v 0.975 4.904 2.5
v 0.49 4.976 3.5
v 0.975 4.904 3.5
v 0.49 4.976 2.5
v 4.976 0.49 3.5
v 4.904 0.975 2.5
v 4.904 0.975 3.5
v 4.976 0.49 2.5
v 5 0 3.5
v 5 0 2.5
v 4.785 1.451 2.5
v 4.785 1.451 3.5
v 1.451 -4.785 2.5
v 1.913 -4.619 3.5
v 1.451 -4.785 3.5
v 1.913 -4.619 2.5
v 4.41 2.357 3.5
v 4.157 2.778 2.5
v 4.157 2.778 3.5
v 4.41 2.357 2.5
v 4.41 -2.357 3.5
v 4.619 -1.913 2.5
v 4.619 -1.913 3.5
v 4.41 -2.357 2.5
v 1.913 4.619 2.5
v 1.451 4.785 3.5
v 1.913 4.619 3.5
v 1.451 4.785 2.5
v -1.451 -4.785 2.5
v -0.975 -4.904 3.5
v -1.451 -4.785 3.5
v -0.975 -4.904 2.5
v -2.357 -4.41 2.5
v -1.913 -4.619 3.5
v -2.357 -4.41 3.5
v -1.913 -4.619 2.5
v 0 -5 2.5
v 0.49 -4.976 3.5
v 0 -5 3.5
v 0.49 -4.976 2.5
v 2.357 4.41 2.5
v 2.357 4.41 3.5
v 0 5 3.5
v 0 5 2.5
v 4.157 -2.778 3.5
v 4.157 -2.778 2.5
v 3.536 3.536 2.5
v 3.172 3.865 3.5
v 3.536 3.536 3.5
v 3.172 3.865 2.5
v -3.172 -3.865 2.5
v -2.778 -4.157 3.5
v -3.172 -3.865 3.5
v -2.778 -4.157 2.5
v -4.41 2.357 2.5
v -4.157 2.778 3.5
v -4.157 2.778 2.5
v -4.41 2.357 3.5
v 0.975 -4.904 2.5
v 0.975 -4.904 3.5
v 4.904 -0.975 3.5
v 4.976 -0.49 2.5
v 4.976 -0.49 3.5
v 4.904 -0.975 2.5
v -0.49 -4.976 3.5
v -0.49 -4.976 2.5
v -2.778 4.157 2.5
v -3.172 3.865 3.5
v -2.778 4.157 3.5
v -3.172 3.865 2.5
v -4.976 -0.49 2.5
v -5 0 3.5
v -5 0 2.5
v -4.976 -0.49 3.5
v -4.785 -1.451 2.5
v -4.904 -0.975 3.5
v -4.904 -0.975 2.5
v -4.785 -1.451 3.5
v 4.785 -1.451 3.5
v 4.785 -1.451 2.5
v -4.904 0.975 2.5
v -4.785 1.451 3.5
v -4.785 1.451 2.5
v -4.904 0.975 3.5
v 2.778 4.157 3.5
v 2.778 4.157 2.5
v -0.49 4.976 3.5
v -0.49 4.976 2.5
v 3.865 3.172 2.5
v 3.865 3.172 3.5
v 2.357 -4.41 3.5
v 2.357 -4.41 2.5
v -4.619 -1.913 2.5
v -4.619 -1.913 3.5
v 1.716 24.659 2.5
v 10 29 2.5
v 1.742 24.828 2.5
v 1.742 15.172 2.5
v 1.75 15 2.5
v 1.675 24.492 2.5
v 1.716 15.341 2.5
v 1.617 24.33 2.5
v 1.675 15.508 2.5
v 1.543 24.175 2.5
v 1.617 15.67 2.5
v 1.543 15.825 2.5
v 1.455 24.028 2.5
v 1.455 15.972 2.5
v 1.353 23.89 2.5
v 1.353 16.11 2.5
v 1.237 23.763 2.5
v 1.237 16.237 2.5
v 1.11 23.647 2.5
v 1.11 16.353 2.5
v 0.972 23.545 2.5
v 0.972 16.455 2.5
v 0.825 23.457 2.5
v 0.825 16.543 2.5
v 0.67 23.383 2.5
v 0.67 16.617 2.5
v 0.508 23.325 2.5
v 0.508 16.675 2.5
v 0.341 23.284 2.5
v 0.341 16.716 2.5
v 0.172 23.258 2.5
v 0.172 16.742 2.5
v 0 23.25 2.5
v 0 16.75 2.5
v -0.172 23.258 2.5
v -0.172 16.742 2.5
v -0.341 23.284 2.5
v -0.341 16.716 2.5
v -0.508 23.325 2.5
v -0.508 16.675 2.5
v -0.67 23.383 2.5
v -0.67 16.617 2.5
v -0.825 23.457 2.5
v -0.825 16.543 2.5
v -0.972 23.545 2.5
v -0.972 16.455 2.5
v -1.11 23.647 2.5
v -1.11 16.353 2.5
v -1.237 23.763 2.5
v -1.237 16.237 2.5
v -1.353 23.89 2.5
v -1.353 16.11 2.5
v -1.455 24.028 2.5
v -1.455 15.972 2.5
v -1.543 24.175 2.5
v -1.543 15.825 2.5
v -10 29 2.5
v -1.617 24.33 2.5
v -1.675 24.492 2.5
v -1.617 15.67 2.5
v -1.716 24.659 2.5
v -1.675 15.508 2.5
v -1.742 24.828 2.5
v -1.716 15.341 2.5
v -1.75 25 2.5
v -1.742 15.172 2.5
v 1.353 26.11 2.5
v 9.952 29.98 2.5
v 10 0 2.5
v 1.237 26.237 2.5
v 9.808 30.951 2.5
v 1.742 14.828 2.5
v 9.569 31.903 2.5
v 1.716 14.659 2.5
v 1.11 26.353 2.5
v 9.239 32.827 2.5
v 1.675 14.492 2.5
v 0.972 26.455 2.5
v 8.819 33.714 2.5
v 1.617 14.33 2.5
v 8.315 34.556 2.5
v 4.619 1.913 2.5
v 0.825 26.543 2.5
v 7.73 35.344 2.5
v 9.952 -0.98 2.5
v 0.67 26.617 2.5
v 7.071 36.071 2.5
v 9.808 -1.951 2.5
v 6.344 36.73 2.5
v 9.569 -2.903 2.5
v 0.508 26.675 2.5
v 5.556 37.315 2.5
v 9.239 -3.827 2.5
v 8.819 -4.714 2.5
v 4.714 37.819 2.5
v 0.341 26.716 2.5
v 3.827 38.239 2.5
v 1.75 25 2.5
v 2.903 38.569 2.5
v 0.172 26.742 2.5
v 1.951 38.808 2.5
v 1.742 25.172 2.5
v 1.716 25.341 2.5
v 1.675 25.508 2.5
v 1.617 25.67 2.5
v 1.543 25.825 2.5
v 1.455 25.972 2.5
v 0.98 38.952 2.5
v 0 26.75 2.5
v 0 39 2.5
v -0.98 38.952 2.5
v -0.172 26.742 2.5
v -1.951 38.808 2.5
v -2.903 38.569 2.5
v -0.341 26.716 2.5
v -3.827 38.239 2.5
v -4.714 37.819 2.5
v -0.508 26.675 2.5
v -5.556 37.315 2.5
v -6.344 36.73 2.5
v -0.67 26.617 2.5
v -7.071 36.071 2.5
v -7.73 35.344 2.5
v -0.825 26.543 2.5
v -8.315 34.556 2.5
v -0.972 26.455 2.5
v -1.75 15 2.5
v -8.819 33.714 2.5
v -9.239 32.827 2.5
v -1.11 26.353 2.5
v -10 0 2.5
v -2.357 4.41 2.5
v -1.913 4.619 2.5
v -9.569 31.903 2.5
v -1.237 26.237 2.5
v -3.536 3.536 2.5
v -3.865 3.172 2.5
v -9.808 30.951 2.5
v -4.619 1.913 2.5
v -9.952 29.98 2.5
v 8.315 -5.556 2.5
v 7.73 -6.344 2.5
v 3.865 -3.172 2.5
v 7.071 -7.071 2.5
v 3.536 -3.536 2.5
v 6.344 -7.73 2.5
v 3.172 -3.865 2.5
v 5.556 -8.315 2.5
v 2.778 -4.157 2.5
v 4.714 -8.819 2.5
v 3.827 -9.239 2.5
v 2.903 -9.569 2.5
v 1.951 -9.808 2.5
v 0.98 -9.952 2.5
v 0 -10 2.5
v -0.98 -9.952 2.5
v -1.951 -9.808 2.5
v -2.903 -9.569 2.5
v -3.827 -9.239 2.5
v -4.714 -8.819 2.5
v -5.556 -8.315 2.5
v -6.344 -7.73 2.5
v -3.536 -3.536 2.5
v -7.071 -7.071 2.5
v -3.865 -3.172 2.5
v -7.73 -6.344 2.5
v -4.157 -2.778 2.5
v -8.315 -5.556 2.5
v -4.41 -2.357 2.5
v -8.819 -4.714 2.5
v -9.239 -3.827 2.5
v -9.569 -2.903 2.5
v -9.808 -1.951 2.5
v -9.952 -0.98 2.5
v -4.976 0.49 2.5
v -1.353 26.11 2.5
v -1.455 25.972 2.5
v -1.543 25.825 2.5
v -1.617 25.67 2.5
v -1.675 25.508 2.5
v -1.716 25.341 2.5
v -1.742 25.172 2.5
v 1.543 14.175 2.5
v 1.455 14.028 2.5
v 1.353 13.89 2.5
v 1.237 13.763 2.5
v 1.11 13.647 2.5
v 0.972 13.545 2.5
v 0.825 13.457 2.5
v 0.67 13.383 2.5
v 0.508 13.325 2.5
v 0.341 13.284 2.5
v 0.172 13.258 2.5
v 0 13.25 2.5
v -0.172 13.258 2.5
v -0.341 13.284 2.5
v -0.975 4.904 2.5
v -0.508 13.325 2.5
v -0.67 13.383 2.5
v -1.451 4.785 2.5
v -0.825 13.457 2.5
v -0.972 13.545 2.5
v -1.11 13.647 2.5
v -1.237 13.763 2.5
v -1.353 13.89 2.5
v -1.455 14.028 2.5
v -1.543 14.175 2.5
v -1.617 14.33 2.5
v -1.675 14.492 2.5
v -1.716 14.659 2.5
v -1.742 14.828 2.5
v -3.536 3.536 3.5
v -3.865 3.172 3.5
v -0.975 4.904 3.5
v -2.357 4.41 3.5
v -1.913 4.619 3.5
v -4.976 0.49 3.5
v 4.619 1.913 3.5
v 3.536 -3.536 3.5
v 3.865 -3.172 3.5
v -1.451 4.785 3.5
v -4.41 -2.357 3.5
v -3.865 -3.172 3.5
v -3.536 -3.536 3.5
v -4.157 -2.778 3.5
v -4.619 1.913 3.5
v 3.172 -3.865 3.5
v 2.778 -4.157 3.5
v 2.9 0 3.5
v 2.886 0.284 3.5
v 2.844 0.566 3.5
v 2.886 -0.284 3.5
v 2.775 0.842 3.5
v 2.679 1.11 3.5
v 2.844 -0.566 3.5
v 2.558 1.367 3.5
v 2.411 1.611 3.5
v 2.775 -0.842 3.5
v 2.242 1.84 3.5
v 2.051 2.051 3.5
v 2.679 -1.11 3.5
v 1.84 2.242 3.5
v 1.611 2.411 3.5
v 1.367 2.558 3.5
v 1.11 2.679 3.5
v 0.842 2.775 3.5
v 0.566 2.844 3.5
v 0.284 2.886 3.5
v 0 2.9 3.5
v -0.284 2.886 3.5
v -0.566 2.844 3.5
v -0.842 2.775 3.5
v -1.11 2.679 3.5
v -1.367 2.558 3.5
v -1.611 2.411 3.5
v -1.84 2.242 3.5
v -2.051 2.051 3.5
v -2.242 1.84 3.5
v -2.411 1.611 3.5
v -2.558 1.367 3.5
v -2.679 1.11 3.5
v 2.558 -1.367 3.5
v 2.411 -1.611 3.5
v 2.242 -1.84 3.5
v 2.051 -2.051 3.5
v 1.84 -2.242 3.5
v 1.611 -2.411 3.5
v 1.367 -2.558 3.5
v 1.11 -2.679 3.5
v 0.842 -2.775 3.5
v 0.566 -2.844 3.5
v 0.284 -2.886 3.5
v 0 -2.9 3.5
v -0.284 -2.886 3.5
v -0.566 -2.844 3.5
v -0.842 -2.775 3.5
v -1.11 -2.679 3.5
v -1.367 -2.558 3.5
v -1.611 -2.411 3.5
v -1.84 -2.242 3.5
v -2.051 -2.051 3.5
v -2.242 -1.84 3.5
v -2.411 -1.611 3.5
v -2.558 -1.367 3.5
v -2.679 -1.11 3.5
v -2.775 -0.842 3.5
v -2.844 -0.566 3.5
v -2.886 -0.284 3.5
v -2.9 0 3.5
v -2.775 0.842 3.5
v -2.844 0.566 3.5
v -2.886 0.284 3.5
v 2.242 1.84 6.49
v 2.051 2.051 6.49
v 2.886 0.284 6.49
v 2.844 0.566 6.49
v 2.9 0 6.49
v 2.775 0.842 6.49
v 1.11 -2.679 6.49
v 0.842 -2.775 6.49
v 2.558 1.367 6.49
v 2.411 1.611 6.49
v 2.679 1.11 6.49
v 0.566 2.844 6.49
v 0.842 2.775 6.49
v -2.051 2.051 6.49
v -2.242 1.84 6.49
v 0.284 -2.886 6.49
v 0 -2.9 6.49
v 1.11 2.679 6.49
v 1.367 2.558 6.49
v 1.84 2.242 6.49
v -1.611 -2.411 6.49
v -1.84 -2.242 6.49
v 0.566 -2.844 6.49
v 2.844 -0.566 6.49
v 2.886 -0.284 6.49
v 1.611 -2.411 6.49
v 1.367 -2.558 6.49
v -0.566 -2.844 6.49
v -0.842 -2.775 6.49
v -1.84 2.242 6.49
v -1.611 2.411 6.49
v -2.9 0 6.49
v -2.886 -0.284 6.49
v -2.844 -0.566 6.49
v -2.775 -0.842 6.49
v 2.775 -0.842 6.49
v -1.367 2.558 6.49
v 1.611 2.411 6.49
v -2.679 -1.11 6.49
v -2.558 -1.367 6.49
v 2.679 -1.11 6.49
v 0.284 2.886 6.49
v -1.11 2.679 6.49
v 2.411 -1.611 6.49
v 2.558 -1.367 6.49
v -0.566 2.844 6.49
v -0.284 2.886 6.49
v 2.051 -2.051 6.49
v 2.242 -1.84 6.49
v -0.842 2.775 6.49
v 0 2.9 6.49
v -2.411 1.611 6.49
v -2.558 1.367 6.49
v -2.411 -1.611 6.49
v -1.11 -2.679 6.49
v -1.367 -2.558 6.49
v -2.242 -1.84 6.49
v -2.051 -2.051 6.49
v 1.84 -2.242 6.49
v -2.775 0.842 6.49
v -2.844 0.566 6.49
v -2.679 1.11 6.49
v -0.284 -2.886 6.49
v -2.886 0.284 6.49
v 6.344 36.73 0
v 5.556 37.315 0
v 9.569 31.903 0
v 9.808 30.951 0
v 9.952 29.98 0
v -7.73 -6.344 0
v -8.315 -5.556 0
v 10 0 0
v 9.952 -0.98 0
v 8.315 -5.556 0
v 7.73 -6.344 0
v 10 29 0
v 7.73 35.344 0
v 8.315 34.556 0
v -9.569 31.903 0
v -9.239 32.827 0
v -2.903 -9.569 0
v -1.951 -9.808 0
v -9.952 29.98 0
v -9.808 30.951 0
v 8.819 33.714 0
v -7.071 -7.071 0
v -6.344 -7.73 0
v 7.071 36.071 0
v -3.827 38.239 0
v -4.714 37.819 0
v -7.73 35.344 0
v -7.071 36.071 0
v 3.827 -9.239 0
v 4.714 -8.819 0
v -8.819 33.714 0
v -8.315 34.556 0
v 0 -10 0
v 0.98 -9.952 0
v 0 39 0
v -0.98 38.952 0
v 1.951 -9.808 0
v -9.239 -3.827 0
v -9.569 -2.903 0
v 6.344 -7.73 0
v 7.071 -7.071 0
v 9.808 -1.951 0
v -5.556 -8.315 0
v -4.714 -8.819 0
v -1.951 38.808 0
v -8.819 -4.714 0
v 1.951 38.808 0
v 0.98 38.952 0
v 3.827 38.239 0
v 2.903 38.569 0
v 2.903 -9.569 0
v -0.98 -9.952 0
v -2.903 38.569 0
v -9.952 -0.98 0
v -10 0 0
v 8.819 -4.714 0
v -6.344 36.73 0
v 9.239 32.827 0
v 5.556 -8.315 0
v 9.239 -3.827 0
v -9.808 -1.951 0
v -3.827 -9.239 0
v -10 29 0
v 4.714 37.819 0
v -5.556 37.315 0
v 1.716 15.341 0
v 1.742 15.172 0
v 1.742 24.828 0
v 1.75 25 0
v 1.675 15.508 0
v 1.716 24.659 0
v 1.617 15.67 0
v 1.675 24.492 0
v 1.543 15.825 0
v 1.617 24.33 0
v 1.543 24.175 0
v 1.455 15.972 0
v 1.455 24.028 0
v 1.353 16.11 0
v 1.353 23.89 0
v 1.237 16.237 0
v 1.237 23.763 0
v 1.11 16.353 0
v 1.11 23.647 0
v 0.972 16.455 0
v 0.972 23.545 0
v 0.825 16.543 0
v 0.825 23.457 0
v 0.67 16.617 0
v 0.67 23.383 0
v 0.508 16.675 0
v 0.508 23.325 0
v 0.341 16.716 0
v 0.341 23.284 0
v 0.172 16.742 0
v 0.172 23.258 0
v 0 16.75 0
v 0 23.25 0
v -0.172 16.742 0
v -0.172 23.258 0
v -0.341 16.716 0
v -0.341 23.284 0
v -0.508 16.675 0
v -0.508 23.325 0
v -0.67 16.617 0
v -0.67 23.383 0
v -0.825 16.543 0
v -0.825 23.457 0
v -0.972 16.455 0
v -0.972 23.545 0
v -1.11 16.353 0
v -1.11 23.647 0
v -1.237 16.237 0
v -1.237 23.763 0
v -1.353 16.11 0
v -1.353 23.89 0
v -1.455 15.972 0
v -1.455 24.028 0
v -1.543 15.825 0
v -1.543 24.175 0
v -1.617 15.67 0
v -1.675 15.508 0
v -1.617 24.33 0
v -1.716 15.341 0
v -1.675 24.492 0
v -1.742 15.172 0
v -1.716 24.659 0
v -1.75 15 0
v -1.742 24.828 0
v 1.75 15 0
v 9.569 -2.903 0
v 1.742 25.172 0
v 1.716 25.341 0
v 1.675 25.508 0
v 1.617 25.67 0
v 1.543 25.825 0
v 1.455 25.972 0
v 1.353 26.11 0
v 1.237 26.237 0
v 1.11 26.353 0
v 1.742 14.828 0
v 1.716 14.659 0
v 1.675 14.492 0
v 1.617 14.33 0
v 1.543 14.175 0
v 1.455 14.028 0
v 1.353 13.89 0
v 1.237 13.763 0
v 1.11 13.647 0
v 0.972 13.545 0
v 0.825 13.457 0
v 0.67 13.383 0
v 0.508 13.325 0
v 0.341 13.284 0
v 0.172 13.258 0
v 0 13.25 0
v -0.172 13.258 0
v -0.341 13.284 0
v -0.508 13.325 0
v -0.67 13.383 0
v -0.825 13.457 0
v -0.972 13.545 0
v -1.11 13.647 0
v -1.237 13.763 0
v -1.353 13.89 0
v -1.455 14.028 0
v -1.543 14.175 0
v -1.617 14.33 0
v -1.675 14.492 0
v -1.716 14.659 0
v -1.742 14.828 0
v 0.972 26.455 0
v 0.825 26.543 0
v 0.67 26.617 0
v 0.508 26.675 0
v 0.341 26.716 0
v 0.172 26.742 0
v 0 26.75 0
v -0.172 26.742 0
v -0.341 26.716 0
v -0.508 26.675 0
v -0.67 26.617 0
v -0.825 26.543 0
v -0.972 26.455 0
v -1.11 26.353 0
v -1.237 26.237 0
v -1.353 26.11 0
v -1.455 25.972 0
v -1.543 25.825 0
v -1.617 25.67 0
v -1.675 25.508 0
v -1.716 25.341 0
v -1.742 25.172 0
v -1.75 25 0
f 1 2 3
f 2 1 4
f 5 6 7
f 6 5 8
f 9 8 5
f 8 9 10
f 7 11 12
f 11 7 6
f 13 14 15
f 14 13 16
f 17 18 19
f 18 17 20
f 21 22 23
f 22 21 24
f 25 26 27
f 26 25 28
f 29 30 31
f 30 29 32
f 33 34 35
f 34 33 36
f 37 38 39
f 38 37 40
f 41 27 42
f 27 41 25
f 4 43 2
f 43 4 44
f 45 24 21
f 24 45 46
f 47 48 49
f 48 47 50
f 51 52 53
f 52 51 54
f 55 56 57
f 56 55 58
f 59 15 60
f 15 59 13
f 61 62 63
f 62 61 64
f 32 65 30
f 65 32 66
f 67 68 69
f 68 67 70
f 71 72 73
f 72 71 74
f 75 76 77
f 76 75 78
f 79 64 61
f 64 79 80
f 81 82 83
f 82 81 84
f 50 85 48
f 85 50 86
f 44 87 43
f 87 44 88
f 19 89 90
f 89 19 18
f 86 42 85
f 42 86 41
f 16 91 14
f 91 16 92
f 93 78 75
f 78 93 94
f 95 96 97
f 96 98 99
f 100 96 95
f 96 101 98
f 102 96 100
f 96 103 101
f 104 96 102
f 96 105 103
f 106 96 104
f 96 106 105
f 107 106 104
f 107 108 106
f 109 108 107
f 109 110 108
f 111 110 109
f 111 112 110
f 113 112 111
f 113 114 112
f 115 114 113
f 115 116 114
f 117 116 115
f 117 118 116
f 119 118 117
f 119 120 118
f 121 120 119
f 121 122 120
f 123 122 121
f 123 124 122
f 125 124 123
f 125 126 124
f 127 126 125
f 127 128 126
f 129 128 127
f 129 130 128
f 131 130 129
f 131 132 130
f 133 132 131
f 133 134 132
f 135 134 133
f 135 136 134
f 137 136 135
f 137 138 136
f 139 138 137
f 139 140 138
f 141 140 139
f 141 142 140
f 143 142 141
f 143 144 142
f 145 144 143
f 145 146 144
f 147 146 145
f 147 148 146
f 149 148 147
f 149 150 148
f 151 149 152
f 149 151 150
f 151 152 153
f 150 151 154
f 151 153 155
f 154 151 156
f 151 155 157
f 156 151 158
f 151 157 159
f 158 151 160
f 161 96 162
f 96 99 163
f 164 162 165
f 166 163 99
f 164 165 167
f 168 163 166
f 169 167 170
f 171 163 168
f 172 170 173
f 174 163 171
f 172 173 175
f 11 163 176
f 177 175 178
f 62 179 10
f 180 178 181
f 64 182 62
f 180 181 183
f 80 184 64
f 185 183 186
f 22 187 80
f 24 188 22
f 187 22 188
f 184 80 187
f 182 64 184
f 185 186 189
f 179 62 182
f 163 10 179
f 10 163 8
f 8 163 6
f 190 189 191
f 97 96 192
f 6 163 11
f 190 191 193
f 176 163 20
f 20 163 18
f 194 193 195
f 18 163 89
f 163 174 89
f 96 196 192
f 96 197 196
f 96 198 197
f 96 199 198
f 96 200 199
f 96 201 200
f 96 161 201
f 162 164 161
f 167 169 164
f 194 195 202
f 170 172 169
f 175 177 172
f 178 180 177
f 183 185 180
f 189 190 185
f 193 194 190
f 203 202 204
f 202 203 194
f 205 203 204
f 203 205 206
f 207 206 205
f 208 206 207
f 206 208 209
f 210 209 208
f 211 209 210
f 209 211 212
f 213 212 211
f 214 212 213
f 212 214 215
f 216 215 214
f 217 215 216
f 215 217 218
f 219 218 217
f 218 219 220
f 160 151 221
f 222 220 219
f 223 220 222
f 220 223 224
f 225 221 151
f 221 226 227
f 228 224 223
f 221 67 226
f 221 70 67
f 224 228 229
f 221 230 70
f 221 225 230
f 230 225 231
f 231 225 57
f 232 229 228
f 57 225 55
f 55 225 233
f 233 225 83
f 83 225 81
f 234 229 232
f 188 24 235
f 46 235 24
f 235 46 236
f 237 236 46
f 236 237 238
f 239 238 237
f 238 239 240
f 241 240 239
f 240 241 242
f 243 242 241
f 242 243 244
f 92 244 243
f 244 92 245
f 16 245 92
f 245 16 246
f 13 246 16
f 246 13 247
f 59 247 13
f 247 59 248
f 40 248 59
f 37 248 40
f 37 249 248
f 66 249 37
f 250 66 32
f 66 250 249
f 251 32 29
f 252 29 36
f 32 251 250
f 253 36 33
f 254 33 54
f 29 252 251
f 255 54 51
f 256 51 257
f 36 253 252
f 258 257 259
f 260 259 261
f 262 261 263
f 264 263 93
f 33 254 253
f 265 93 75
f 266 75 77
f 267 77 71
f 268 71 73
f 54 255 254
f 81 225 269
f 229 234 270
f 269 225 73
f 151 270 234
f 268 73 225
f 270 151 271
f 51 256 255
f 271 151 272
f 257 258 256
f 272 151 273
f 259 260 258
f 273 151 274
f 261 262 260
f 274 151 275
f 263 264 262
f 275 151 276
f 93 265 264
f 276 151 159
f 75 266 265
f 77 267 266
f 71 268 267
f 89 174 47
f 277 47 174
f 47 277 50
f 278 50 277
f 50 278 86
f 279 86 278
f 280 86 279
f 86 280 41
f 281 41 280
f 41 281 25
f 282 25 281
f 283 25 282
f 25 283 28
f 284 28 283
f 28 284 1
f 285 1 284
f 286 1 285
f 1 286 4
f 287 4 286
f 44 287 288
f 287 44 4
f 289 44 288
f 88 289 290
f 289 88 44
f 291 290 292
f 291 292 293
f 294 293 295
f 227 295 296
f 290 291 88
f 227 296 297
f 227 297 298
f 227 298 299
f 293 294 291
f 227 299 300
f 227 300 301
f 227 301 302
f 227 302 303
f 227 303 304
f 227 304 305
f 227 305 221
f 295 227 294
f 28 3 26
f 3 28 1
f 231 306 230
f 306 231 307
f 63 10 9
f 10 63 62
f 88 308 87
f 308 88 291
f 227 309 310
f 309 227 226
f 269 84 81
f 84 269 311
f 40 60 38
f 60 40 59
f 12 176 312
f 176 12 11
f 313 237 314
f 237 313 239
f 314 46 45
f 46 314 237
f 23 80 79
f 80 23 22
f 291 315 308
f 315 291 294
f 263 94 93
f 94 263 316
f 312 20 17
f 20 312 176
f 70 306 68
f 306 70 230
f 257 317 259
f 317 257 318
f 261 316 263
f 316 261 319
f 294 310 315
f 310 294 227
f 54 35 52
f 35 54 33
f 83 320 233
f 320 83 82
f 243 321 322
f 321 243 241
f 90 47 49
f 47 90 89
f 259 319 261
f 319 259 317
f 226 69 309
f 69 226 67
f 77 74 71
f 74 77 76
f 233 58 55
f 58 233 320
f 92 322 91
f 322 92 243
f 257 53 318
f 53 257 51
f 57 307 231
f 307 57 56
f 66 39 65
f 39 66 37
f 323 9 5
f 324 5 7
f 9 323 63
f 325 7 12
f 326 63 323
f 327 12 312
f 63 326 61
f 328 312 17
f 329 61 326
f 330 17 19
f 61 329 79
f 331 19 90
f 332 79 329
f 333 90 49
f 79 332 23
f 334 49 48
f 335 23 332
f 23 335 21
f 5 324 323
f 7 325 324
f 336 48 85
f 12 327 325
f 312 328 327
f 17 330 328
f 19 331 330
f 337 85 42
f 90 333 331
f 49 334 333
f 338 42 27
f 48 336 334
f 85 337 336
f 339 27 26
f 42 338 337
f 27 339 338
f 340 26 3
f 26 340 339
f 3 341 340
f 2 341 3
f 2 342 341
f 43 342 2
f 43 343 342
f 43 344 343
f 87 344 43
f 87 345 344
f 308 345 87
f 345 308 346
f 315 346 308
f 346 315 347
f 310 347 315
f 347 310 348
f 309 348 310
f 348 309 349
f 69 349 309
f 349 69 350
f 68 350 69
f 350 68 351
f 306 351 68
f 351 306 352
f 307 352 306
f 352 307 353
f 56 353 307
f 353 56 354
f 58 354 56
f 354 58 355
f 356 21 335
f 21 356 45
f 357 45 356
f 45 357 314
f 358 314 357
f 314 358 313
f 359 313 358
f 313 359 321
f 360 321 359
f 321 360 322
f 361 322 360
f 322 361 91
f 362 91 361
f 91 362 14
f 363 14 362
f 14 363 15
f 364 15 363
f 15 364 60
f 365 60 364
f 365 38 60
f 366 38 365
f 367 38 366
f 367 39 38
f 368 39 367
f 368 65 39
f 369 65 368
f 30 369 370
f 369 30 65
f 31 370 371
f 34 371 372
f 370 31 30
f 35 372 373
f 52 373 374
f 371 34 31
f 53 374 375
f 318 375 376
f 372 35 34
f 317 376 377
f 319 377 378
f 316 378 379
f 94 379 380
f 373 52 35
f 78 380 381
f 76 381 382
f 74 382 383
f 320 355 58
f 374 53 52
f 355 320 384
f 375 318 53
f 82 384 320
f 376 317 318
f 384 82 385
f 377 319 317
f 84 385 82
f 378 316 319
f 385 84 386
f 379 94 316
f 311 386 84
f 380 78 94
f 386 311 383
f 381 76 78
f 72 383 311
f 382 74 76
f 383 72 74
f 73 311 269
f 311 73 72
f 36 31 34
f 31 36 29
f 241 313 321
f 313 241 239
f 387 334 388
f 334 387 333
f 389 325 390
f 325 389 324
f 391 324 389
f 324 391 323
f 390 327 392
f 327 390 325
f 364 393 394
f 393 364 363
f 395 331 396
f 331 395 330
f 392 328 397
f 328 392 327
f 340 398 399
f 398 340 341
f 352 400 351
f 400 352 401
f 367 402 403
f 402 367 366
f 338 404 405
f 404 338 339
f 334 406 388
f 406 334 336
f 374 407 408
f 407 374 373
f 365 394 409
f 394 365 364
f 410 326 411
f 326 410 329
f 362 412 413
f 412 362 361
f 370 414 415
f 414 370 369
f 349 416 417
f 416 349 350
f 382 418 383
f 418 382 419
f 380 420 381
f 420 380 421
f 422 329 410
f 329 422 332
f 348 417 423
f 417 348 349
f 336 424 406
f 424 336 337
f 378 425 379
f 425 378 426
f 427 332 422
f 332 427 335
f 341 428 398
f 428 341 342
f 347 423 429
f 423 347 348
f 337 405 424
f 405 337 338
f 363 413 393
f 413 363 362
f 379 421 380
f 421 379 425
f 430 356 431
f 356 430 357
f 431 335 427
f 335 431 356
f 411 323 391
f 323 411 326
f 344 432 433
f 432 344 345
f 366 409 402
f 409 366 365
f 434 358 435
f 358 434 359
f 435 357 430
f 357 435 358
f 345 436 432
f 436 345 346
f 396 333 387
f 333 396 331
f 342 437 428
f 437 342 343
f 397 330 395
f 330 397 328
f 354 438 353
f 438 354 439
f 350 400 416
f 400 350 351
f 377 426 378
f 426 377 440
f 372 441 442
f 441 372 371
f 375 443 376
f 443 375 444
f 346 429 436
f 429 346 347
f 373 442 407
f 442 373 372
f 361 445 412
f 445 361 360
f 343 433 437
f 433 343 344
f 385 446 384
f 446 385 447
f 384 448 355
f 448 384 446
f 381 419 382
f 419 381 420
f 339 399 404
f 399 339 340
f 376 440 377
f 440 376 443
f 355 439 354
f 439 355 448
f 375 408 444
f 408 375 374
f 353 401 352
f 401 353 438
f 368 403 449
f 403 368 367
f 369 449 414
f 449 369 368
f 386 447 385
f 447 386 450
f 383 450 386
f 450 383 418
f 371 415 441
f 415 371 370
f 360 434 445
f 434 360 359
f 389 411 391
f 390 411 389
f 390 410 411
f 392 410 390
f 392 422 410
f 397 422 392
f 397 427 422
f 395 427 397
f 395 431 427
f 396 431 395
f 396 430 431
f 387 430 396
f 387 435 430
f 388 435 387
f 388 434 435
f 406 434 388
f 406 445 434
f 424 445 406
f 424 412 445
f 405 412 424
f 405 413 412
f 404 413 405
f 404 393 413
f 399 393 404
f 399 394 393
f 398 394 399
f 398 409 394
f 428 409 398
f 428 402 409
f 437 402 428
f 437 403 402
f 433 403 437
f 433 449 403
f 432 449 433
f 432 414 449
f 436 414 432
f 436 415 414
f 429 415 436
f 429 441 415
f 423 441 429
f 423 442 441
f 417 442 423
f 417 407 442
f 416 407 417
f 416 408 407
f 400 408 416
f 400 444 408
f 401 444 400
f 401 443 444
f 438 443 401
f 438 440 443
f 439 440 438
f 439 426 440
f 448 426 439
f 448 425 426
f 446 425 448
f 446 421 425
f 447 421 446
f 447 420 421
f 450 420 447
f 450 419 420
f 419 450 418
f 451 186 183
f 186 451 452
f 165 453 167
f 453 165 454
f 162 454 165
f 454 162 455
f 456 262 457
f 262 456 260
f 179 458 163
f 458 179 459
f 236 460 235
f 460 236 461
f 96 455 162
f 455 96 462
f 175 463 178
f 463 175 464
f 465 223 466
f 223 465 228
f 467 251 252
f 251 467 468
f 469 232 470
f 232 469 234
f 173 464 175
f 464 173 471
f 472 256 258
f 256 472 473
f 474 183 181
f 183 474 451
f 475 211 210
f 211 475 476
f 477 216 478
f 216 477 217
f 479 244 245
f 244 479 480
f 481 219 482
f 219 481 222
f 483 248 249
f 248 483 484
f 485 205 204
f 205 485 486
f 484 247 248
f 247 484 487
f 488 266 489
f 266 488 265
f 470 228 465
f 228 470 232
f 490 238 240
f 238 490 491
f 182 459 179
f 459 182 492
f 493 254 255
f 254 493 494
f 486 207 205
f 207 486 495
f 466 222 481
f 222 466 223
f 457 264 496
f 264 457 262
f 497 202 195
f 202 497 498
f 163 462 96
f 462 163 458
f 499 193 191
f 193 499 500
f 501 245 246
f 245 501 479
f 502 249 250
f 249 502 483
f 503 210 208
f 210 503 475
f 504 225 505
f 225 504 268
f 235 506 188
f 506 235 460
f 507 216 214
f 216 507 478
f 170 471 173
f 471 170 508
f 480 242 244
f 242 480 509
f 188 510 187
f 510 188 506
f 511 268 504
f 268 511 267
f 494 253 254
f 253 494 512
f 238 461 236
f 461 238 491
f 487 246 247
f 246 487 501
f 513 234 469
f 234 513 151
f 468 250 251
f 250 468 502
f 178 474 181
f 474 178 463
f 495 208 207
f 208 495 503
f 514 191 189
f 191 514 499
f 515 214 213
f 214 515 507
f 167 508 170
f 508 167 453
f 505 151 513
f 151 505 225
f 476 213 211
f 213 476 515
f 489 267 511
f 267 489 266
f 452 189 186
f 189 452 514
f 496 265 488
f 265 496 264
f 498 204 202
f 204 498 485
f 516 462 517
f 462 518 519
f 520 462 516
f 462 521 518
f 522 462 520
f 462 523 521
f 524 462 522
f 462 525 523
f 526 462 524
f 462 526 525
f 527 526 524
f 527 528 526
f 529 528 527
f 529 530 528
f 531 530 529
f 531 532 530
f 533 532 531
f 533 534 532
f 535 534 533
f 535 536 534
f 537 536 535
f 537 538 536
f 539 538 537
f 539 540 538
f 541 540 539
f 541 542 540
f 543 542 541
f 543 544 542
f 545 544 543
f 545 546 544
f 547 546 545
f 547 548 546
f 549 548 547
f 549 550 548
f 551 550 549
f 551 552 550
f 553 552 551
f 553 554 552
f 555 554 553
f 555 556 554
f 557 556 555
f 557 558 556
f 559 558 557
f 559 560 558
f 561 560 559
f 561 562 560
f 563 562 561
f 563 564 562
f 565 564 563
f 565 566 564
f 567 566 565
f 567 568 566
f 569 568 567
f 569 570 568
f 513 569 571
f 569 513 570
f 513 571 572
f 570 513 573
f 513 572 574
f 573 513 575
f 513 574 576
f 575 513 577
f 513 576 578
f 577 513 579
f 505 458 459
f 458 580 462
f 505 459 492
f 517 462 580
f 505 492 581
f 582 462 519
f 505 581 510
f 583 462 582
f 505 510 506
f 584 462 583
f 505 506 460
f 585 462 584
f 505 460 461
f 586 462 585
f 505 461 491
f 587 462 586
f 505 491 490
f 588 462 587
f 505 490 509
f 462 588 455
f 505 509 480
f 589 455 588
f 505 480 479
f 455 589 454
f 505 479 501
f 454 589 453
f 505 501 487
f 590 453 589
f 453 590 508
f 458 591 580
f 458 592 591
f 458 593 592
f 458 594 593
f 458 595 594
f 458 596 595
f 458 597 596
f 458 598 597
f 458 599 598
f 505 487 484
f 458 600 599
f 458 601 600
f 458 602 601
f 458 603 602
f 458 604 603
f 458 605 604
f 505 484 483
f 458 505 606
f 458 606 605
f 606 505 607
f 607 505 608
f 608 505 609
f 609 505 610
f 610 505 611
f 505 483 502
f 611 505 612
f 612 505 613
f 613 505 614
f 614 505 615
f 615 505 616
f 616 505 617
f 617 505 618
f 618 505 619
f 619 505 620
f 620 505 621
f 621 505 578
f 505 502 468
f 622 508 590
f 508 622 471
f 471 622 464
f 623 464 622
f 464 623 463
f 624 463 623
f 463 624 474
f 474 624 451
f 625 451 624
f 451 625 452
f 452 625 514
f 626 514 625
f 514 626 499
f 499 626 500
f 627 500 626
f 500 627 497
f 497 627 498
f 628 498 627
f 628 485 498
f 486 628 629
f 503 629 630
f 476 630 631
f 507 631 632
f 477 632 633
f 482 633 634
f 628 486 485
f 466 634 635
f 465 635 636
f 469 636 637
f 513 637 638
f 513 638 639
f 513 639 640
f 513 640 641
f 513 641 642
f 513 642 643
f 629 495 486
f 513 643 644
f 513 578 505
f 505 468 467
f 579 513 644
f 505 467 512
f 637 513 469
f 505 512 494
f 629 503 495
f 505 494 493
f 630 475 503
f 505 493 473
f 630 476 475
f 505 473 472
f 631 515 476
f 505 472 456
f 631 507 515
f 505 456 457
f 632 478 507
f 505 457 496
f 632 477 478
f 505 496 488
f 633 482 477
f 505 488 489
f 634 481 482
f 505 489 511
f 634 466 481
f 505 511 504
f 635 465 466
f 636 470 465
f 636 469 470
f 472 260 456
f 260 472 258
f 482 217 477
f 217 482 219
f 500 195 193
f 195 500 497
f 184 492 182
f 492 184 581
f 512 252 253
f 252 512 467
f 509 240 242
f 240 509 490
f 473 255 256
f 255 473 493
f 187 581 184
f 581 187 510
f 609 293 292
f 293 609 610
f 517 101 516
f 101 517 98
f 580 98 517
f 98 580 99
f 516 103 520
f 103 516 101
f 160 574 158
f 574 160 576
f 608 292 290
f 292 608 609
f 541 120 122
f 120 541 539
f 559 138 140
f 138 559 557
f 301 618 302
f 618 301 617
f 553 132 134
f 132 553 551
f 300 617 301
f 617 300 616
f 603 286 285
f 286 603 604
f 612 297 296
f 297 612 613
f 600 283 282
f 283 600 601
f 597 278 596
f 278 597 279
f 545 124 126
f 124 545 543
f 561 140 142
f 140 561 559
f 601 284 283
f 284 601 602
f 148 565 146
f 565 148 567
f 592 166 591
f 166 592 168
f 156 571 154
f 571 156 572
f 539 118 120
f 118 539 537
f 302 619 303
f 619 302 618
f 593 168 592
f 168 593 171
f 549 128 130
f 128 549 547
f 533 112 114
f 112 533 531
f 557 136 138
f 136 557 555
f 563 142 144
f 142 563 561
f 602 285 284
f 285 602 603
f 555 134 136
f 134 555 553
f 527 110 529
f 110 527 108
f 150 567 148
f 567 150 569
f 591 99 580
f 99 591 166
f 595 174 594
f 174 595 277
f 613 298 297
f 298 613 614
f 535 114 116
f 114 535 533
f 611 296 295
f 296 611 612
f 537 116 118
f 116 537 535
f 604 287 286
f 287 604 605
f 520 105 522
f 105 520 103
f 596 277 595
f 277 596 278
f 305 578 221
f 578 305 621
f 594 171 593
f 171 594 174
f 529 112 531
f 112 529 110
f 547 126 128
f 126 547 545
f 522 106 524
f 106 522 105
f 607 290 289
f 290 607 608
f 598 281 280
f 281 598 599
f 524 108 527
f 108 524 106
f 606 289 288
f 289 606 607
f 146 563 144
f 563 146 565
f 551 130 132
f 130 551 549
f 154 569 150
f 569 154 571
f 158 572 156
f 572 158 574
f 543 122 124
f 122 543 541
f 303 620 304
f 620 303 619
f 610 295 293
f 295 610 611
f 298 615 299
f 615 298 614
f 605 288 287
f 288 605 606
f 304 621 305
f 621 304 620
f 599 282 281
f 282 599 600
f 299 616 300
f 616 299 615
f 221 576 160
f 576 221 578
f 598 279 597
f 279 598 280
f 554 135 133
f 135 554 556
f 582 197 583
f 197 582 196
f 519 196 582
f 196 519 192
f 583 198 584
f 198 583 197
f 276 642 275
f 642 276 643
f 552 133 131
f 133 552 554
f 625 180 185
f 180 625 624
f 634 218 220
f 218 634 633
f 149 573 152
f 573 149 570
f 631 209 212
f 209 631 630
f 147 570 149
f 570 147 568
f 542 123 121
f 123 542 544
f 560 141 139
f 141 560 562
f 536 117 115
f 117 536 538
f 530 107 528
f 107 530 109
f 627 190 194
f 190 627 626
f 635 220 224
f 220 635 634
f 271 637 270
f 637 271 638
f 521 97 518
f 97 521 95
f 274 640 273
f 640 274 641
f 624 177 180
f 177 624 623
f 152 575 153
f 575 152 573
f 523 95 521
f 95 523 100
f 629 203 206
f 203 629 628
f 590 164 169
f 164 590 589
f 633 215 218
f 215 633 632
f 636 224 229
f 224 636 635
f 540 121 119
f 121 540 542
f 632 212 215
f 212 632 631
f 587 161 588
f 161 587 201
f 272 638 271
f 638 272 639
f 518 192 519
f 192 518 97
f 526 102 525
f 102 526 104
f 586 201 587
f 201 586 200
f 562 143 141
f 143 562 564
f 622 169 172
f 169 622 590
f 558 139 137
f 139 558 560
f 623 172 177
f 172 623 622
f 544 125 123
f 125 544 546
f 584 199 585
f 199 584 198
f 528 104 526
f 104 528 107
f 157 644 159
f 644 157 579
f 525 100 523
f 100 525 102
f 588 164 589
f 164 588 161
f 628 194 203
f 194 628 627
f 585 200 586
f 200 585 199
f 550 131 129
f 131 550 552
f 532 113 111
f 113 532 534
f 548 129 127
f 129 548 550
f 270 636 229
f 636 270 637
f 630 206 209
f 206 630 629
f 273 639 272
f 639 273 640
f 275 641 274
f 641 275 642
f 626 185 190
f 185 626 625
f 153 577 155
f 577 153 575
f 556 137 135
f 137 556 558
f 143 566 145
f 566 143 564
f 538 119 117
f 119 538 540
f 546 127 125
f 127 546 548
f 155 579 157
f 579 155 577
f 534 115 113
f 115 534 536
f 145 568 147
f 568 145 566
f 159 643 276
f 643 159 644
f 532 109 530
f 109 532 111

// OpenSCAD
// file: subpieces/articulation-axis.scad
articulationAxisSubPiece();

module articulationAxisSubPiece(
    base_diameter,
    base_height,
    axis_diameter,
    axis_height,
    _fn = 64
) {
    // servo body r = 11.8 / 2
    // servo axis r = 4.6 / 2

    debug_colors = true;
    base_color = "red";
    axis_color = "green";

    color(debug_colors ? base_color : "")
    cylinder(
        r = base_diameter / 2,
        h = base_height,
        $fn = _fn
    );
    translate(
        [
            0,
            0,
            base_height
        ])
        color(debug_colors ? axis_color : "")
        cylinder(
            r = axis_diameter / 2,
            h = axis_height,
            $fn = _fn
        );

}
// file: ../envelopes/servo-envelope.scad
// Enveloppe for servo holes fixations
// Around the servo motor and the fixation holes

module servoEnvelope(
    servo_hole_scale = 1,
    screw_hole_diameter = 2
) {

    servo_length = 22.2;
    servo_width = 11.8;
    servo_height = 22.7;

    // translating to center the servo motor envelope as servo
    scale(servo_hole_scale)
        translate([-servo_width / 2, - servo_length + (servo_width / 2), -servo_height/2])
            cube([servo_width, servo_length, servo_height], center = false);    

    
    translate([-servo_width / 2, - servo_length + (servo_width / 2), -servo_height/2]) {
        translate([servo_width / 2, - 2.3, 0])
            cylinder(h = servo_height, r = 1, center = false, $fn = 16);

        translate([servo_width / 2, servo_length + 2.3, 0])
            cylinder(h = servo_height, r = 1, center = false, $fn = 16);
    }
}
// main file
use <../envelopes/servo-envelope.scad>
use <./subpieces/articulation-axis.scad>

legPieceE();

/**
 * LegPieceE
 * @name LegPieceE
 * @description Leg Piece E
 * @category leg
 * @tag piece
 * @type piece
 * @parent LegComponent
 */
module legPieceE(
    length = 29,
    servo_axis_offset = 52,
    screw_hole_offset_1 = 15,
    screw_hole_offset_2 = 25,
) {

    screw_hole_diameter = 3.5;

    _fn = 64;
    width = 10;
    thickness = 2.5;

    support_diameter = 12;
    support_thickness = 0.0;
    
    articluation_axis_diameter_offest = 0.2;

    hole_diameter = 3;

    difference() {

        union() {

            hull() {
                cylinder(h = thickness, r = width, center = false, $fn = _fn);
                translate([0, length, 0])
                cylinder(h = thickness, r = width, center = false, $fn = _fn);
            }
            
            translate([0, 0, thickness]) {
                cylinder(h = support_thickness, r = support_diameter / 2, center = false, $fn = _fn);
                translate([0, 0, support_thickness])
                    rotate([0, 0, 0])
                        articulationAxisSubPiece(
                            base_diameter = 10,
                            base_height = 1,
                            axis_diameter = 6 - articluation_axis_diameter_offest,
                            axis_height = 3 - 0.01
                        );
            }
        }
        
        translate([0, screw_hole_offset_1, thickness / 2])
            cylinder(h = thickness * 2, r = screw_hole_diameter / 2, center = true, $fn = _fn);

        translate([0, screw_hole_offset_2, thickness / 2])
            cylinder(h = thickness * 2, r = screw_hole_diameter / 2, center = true, $fn = _fn);

    }
}
